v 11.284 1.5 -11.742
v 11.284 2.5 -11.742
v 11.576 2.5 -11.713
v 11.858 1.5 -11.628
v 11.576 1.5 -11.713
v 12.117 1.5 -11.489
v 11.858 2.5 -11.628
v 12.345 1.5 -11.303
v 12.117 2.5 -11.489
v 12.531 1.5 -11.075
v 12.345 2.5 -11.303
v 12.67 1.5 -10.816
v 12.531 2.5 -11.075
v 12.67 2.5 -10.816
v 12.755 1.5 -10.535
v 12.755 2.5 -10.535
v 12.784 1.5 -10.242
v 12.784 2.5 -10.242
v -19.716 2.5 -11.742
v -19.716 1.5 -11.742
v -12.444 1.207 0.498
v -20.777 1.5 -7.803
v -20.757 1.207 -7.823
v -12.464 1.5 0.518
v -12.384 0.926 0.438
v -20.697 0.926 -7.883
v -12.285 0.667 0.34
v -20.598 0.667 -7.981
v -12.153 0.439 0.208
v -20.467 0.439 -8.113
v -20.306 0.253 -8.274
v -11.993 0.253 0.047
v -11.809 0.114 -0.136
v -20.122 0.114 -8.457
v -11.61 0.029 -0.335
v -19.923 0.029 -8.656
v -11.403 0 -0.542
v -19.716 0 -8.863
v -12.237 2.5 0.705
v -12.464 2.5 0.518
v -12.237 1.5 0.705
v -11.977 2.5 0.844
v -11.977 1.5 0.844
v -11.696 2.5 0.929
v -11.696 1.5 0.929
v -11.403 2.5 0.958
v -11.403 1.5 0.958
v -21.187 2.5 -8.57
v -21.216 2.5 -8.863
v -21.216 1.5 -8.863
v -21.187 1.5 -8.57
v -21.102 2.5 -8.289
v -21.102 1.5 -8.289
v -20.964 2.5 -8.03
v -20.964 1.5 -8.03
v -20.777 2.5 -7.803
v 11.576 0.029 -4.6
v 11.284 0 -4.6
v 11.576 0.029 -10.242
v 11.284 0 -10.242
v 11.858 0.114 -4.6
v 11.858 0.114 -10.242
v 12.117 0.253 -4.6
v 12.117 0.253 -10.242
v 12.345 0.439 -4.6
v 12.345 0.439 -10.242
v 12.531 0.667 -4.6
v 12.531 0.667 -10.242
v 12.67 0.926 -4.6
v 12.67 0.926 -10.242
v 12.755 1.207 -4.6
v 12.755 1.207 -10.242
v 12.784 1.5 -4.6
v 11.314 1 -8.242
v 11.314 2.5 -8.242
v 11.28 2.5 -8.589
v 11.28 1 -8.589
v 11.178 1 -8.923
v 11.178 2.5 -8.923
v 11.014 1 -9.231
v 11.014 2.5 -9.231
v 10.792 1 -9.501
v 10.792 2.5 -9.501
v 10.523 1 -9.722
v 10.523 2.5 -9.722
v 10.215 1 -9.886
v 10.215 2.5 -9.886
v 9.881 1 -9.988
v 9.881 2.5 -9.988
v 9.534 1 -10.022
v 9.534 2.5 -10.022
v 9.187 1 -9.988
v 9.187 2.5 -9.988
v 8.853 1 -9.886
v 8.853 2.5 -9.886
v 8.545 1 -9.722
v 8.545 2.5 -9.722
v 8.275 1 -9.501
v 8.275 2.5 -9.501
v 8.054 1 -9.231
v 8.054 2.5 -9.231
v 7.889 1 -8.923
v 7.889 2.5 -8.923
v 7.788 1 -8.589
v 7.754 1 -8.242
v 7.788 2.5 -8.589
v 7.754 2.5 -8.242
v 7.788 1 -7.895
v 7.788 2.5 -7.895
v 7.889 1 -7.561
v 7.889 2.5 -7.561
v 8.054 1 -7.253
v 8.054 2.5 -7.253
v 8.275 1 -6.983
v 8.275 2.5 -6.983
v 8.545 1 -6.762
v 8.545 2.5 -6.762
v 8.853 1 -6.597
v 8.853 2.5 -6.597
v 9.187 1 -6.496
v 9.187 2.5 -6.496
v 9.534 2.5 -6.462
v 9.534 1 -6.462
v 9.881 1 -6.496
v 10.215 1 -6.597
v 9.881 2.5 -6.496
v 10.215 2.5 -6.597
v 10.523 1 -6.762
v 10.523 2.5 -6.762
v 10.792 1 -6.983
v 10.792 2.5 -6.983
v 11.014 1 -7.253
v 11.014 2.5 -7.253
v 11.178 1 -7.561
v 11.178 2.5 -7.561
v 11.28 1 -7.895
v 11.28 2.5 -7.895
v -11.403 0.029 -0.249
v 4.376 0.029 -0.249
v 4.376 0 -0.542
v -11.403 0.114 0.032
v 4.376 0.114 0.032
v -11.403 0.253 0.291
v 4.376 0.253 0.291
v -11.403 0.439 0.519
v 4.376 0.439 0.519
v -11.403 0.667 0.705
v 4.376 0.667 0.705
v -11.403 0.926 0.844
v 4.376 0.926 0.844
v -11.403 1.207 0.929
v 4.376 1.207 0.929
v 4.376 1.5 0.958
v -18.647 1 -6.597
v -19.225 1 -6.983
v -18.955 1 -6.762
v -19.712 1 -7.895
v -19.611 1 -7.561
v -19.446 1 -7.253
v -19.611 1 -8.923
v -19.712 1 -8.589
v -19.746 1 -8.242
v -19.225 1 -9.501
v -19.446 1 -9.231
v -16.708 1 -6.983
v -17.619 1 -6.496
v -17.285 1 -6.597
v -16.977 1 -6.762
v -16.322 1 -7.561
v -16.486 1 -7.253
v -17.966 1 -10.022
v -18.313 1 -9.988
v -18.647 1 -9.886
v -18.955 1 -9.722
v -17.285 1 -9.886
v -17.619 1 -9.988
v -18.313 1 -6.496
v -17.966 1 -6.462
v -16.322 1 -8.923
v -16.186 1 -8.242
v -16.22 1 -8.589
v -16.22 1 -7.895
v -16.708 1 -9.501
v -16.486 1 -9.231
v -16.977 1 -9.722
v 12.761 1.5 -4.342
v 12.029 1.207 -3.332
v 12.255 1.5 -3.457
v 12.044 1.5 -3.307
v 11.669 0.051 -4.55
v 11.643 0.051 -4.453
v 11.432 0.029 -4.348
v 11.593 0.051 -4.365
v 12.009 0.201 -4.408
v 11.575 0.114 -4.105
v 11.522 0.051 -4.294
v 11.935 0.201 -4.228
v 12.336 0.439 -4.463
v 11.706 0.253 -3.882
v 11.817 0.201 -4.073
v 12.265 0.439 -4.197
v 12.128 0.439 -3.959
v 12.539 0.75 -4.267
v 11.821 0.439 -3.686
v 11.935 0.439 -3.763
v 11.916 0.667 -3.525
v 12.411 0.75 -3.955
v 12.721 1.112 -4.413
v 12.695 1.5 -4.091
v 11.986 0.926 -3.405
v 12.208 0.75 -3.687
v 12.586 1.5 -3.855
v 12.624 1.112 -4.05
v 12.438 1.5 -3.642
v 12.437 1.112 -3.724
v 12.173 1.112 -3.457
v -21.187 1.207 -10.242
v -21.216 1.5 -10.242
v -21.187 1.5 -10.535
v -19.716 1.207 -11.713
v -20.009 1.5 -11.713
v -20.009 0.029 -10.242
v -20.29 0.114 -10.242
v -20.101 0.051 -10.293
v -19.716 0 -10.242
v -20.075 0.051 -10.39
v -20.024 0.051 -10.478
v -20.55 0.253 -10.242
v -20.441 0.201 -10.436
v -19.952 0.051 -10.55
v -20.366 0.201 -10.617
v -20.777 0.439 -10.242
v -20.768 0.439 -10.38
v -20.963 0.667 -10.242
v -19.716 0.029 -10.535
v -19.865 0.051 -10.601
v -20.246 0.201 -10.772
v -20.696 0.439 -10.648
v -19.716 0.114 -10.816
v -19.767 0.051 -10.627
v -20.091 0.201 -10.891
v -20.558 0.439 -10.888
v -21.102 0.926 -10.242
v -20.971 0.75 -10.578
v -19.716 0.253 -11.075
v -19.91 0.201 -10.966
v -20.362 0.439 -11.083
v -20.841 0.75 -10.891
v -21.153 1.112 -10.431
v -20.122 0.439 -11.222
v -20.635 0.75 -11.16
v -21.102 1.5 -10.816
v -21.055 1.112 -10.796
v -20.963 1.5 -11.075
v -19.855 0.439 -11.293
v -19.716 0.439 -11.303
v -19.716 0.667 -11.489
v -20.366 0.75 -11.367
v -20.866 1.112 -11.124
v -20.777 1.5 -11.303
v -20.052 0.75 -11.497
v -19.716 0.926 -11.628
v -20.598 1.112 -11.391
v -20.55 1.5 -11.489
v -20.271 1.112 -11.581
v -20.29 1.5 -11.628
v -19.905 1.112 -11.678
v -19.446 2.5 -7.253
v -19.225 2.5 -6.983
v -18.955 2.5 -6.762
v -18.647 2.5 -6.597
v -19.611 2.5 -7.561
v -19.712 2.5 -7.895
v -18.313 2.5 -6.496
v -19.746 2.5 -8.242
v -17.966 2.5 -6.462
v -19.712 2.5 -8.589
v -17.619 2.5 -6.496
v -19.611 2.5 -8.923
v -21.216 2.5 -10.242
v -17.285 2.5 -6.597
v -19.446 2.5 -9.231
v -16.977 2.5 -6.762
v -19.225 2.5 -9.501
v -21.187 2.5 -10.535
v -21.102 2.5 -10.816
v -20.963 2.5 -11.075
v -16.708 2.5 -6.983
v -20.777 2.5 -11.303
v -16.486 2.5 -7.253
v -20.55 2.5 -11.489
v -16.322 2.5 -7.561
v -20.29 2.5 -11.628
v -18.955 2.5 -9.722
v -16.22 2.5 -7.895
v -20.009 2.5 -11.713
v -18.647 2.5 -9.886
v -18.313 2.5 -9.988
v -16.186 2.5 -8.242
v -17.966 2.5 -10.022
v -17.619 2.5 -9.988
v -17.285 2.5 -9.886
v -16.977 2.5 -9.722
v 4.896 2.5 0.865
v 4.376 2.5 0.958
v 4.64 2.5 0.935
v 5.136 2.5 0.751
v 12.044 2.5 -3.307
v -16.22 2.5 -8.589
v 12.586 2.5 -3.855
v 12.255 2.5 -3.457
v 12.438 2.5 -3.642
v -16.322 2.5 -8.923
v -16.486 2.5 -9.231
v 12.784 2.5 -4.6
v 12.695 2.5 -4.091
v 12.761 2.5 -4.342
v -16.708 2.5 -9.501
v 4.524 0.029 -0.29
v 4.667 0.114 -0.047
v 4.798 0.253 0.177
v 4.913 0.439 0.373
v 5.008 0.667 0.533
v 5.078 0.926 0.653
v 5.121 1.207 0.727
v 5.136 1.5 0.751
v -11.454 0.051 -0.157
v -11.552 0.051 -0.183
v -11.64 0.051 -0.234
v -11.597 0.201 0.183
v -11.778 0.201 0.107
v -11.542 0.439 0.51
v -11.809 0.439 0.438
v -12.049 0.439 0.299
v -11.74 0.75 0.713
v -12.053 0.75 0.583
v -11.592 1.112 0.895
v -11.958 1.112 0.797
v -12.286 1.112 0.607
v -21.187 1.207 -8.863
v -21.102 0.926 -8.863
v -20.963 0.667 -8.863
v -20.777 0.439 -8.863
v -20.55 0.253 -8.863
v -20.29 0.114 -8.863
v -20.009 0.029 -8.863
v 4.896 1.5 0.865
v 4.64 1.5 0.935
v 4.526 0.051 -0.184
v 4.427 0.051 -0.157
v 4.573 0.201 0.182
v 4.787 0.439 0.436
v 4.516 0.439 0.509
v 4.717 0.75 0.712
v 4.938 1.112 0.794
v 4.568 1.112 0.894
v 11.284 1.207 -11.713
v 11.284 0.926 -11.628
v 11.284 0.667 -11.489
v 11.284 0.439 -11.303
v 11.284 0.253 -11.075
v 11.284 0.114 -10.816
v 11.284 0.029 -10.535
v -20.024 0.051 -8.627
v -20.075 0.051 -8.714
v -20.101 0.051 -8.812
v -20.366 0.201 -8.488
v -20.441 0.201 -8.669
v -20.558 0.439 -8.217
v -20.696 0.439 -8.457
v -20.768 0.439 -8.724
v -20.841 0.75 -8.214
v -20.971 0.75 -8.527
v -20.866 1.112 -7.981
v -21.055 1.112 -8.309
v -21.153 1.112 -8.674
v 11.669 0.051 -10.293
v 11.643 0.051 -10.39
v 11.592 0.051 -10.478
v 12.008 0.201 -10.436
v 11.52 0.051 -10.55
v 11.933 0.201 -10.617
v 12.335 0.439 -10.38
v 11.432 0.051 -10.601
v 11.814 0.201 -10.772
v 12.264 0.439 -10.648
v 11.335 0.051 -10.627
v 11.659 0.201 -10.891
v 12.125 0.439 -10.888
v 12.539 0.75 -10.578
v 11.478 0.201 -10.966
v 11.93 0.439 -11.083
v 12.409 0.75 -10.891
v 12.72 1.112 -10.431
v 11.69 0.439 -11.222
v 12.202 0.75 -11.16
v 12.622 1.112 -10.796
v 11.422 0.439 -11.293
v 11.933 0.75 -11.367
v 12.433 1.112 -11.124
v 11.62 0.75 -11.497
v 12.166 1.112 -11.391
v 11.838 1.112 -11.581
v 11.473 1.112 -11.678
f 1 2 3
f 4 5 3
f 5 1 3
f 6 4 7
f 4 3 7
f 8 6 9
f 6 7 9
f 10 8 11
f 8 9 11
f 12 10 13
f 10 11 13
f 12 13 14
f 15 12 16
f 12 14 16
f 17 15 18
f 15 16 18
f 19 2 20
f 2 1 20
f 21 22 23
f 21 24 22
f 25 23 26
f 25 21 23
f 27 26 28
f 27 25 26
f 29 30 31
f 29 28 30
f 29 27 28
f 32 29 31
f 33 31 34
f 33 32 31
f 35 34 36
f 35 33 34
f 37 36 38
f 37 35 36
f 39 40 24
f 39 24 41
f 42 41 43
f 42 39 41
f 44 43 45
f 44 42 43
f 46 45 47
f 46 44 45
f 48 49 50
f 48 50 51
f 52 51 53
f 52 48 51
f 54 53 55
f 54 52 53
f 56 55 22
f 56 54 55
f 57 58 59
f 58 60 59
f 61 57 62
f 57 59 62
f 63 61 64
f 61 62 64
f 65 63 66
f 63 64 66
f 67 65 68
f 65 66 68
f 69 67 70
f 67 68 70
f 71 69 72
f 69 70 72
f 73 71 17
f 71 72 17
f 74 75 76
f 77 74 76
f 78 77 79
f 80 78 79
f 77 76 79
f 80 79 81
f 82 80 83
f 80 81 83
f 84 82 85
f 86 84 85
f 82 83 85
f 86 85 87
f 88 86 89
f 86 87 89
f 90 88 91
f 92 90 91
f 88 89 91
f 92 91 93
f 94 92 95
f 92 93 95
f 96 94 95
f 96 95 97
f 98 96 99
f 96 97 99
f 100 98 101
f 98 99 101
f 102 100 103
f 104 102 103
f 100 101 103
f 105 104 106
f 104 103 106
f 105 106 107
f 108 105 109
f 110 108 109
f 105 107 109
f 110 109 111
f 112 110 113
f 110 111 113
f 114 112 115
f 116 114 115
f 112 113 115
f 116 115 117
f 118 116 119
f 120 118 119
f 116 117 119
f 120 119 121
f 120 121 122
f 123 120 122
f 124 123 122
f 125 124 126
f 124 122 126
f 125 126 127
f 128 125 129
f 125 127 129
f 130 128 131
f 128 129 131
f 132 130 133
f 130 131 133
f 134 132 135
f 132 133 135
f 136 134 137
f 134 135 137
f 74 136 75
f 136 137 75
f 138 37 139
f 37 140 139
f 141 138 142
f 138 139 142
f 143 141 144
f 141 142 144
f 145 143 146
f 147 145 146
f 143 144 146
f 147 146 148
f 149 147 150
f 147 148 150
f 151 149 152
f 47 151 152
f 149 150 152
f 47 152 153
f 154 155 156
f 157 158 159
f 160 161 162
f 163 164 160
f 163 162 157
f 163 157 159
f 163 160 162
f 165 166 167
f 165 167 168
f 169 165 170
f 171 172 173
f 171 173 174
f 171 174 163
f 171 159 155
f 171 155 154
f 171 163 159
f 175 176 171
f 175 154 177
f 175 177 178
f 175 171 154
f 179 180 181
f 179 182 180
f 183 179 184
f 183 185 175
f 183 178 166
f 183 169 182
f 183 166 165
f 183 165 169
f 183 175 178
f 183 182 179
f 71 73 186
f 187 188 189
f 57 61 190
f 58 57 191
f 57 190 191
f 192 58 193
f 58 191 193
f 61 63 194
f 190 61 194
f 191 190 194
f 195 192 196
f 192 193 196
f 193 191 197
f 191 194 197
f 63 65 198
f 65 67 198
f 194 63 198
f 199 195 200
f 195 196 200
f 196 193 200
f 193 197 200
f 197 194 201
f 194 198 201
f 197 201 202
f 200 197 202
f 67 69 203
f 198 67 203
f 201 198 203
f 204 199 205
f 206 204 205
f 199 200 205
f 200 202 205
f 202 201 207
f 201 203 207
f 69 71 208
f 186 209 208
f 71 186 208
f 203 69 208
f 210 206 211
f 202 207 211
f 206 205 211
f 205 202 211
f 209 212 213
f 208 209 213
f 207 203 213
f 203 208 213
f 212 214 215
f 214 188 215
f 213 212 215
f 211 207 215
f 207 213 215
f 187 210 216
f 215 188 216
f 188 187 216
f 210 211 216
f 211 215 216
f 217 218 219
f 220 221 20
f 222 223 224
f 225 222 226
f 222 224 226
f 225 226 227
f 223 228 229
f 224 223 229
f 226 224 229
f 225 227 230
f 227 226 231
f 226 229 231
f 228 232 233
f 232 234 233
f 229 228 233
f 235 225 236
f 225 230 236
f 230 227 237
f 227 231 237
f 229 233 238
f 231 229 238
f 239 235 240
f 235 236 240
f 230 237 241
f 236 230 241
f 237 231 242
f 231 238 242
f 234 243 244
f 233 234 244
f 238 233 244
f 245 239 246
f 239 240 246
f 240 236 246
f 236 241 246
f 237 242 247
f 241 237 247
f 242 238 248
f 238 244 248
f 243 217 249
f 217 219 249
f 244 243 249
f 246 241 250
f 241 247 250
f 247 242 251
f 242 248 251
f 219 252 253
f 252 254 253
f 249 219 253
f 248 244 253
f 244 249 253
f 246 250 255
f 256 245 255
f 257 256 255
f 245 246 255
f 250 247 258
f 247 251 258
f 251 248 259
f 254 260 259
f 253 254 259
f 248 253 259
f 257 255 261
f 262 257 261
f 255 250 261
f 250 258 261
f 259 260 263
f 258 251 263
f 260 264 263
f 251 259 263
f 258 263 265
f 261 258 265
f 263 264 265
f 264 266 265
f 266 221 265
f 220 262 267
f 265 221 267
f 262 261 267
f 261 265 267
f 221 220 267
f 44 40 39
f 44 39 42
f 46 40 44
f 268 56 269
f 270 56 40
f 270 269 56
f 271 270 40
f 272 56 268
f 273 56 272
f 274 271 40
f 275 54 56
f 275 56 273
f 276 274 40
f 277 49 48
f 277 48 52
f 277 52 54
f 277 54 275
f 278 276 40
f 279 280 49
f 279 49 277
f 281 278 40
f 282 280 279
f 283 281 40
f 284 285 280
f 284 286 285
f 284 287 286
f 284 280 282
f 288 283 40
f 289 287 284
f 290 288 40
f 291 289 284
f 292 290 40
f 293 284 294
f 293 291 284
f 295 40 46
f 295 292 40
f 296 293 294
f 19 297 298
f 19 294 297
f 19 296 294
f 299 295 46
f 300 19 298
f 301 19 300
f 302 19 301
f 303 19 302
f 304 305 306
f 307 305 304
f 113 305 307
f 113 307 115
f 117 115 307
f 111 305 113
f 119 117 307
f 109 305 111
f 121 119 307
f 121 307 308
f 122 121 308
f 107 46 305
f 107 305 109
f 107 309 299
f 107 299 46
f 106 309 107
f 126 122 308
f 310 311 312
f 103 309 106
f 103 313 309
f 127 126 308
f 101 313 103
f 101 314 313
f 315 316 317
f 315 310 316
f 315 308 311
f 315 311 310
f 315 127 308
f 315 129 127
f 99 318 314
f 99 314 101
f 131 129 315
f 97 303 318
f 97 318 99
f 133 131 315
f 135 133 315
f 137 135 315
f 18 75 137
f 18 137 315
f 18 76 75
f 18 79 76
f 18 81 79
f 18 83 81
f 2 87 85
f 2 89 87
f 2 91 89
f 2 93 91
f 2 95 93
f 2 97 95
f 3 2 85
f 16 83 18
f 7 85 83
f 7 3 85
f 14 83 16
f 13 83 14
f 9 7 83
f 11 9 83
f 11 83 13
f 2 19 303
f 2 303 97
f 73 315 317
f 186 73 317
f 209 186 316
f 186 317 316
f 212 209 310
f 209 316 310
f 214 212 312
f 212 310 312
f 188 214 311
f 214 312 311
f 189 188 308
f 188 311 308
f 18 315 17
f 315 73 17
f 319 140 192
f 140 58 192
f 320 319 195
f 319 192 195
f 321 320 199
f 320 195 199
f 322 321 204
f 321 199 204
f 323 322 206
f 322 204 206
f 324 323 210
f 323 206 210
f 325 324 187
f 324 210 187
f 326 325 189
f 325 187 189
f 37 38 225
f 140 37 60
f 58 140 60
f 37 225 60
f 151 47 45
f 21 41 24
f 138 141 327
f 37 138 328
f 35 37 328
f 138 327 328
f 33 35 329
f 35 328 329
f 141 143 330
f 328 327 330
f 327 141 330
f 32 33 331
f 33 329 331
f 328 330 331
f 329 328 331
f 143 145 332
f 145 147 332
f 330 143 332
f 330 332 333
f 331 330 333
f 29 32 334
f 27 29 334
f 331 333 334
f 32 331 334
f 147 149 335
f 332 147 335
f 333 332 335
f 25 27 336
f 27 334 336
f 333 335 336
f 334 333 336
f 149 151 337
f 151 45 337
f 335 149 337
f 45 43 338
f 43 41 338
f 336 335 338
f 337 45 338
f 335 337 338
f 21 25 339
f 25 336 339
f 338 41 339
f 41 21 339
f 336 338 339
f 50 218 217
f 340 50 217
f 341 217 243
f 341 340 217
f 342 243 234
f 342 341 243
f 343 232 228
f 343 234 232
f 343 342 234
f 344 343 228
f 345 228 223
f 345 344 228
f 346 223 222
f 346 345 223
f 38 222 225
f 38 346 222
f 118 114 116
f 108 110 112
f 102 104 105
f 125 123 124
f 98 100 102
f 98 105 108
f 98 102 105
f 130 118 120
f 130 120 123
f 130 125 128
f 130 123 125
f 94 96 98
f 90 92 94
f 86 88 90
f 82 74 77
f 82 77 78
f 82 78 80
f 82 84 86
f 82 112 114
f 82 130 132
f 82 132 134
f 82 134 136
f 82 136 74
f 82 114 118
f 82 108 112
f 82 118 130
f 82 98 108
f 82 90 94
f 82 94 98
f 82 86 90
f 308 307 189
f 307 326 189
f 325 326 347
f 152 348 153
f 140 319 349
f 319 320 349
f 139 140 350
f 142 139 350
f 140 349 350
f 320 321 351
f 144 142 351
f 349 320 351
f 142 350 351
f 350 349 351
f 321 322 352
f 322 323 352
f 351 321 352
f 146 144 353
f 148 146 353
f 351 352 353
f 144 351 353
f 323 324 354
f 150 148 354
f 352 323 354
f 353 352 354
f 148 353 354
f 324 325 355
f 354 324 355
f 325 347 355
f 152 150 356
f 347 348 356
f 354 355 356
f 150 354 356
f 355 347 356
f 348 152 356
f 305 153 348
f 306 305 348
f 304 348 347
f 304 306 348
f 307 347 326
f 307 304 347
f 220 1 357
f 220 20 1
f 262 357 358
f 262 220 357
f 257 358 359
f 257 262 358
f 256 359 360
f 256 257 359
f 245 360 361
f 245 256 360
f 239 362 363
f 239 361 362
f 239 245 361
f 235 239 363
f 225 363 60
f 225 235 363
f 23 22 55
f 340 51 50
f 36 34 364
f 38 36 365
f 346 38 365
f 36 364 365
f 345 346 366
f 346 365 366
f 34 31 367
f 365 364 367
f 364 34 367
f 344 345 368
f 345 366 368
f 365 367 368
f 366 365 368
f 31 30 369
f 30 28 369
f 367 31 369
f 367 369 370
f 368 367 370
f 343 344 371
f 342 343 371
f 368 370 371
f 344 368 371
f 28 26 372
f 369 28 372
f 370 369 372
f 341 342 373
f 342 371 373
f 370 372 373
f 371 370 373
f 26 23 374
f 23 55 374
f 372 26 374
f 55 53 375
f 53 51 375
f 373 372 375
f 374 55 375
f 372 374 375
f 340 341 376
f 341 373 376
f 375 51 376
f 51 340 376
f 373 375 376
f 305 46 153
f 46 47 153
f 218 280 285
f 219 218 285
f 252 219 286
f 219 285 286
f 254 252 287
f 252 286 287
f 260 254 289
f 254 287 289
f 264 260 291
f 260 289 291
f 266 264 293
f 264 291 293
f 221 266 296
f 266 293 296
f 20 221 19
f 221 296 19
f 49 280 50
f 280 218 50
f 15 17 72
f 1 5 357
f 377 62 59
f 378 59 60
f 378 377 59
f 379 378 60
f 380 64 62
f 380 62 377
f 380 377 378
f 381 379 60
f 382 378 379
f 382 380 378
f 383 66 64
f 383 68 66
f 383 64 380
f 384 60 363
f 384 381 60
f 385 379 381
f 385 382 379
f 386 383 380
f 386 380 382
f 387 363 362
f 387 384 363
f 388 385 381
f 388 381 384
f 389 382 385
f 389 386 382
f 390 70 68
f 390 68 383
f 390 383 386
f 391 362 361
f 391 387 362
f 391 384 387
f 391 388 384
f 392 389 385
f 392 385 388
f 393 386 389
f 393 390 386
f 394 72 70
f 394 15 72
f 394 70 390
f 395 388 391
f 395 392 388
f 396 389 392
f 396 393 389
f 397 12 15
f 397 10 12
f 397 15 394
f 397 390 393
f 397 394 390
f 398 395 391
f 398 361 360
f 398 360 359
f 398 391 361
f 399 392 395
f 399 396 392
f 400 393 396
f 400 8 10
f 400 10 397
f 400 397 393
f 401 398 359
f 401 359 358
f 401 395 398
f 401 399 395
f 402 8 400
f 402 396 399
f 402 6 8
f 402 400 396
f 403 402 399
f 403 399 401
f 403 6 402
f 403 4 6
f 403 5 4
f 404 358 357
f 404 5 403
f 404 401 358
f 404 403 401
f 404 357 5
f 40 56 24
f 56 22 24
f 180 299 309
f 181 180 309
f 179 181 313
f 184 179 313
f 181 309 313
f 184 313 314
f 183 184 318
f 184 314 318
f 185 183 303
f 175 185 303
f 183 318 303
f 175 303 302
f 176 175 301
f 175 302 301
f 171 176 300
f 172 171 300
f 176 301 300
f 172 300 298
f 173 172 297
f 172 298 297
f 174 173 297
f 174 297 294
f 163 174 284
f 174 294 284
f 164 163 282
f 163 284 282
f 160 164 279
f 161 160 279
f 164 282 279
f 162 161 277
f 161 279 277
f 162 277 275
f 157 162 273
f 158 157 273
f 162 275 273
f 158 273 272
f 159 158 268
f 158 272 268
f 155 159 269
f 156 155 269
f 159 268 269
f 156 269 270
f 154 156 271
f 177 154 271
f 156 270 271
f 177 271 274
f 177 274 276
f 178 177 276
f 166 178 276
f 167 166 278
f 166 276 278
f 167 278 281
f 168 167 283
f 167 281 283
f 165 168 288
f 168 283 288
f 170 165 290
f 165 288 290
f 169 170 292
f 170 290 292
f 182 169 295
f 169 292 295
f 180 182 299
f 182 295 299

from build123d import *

# Parameters (mm, degrees)
BOSS_EXTRUDE1_DEPTH = 2.5
SKETCH4_R           = 1.78
CUT_EXTRUDE1_DEPTH  = 1.5
FILLET1_R           = 1.5


with BuildPart() as part:
    # Sketch2 → Boss-Extrude1 (new body)
    with BuildSketch(Plane(origin=(0, 0, 0), x_dir=(1, 0, 0), z_dir=(0, 1, 0))):
        Polygon((-21.216153836, 11.741903429), (-21.216153836, 8.241903429), (-12.024866066, -0.958096571), (4.783846164, -0.958096571), (12.783846164, 3.741903429), (12.783846164, 11.741903429), align=None)
    extrude(amount=BOSS_EXTRUDE1_DEPTH)

    # Sketch4 → Cut-Extrude1 (cut)
    with BuildSketch(Plane(origin=(0, 2.5, 0), x_dir=(1, 0, 0), z_dir=(0, 1, 0))):
        with Locations((-17.966153836, 8.241903429)):
            Circle(SKETCH4_R)
        with Locations((9.533846164, 8.241903429)):
            Circle(SKETCH4_R)
    extrude(amount=-CUT_EXTRUDE1_DEPTH, mode=Mode.SUBTRACT)

    # Fillet1
    fillet1_edges = [part.edges().sort_by_distance(p)[0] for p in [
        (12.783846164, 1.25, -11.741903429),
        (12.783846164, 1.25, -3.741903429),
        (4.783846164, 1.25, 0.958096571),
        (-12.024866066, 1.25, 0.958096571),
        (-21.216153836, 1.25, -8.241903429),
        (-21.216153836, 1.25, -11.741903429),
        (12.783846164, 0, -7.741903429),
        (8.783846164, 0, -1.391903429),
        (-3.620509951, 0, 0.958096571),
        (-16.620509951, 0, -3.641903429),
        (-21.216153836, 0, -9.991903429),
        (-4.216153836, 0, -11.741903429),
    ]]
    fillet(fillet1_edges, radius=FILLET1_R)


solid = part.part
